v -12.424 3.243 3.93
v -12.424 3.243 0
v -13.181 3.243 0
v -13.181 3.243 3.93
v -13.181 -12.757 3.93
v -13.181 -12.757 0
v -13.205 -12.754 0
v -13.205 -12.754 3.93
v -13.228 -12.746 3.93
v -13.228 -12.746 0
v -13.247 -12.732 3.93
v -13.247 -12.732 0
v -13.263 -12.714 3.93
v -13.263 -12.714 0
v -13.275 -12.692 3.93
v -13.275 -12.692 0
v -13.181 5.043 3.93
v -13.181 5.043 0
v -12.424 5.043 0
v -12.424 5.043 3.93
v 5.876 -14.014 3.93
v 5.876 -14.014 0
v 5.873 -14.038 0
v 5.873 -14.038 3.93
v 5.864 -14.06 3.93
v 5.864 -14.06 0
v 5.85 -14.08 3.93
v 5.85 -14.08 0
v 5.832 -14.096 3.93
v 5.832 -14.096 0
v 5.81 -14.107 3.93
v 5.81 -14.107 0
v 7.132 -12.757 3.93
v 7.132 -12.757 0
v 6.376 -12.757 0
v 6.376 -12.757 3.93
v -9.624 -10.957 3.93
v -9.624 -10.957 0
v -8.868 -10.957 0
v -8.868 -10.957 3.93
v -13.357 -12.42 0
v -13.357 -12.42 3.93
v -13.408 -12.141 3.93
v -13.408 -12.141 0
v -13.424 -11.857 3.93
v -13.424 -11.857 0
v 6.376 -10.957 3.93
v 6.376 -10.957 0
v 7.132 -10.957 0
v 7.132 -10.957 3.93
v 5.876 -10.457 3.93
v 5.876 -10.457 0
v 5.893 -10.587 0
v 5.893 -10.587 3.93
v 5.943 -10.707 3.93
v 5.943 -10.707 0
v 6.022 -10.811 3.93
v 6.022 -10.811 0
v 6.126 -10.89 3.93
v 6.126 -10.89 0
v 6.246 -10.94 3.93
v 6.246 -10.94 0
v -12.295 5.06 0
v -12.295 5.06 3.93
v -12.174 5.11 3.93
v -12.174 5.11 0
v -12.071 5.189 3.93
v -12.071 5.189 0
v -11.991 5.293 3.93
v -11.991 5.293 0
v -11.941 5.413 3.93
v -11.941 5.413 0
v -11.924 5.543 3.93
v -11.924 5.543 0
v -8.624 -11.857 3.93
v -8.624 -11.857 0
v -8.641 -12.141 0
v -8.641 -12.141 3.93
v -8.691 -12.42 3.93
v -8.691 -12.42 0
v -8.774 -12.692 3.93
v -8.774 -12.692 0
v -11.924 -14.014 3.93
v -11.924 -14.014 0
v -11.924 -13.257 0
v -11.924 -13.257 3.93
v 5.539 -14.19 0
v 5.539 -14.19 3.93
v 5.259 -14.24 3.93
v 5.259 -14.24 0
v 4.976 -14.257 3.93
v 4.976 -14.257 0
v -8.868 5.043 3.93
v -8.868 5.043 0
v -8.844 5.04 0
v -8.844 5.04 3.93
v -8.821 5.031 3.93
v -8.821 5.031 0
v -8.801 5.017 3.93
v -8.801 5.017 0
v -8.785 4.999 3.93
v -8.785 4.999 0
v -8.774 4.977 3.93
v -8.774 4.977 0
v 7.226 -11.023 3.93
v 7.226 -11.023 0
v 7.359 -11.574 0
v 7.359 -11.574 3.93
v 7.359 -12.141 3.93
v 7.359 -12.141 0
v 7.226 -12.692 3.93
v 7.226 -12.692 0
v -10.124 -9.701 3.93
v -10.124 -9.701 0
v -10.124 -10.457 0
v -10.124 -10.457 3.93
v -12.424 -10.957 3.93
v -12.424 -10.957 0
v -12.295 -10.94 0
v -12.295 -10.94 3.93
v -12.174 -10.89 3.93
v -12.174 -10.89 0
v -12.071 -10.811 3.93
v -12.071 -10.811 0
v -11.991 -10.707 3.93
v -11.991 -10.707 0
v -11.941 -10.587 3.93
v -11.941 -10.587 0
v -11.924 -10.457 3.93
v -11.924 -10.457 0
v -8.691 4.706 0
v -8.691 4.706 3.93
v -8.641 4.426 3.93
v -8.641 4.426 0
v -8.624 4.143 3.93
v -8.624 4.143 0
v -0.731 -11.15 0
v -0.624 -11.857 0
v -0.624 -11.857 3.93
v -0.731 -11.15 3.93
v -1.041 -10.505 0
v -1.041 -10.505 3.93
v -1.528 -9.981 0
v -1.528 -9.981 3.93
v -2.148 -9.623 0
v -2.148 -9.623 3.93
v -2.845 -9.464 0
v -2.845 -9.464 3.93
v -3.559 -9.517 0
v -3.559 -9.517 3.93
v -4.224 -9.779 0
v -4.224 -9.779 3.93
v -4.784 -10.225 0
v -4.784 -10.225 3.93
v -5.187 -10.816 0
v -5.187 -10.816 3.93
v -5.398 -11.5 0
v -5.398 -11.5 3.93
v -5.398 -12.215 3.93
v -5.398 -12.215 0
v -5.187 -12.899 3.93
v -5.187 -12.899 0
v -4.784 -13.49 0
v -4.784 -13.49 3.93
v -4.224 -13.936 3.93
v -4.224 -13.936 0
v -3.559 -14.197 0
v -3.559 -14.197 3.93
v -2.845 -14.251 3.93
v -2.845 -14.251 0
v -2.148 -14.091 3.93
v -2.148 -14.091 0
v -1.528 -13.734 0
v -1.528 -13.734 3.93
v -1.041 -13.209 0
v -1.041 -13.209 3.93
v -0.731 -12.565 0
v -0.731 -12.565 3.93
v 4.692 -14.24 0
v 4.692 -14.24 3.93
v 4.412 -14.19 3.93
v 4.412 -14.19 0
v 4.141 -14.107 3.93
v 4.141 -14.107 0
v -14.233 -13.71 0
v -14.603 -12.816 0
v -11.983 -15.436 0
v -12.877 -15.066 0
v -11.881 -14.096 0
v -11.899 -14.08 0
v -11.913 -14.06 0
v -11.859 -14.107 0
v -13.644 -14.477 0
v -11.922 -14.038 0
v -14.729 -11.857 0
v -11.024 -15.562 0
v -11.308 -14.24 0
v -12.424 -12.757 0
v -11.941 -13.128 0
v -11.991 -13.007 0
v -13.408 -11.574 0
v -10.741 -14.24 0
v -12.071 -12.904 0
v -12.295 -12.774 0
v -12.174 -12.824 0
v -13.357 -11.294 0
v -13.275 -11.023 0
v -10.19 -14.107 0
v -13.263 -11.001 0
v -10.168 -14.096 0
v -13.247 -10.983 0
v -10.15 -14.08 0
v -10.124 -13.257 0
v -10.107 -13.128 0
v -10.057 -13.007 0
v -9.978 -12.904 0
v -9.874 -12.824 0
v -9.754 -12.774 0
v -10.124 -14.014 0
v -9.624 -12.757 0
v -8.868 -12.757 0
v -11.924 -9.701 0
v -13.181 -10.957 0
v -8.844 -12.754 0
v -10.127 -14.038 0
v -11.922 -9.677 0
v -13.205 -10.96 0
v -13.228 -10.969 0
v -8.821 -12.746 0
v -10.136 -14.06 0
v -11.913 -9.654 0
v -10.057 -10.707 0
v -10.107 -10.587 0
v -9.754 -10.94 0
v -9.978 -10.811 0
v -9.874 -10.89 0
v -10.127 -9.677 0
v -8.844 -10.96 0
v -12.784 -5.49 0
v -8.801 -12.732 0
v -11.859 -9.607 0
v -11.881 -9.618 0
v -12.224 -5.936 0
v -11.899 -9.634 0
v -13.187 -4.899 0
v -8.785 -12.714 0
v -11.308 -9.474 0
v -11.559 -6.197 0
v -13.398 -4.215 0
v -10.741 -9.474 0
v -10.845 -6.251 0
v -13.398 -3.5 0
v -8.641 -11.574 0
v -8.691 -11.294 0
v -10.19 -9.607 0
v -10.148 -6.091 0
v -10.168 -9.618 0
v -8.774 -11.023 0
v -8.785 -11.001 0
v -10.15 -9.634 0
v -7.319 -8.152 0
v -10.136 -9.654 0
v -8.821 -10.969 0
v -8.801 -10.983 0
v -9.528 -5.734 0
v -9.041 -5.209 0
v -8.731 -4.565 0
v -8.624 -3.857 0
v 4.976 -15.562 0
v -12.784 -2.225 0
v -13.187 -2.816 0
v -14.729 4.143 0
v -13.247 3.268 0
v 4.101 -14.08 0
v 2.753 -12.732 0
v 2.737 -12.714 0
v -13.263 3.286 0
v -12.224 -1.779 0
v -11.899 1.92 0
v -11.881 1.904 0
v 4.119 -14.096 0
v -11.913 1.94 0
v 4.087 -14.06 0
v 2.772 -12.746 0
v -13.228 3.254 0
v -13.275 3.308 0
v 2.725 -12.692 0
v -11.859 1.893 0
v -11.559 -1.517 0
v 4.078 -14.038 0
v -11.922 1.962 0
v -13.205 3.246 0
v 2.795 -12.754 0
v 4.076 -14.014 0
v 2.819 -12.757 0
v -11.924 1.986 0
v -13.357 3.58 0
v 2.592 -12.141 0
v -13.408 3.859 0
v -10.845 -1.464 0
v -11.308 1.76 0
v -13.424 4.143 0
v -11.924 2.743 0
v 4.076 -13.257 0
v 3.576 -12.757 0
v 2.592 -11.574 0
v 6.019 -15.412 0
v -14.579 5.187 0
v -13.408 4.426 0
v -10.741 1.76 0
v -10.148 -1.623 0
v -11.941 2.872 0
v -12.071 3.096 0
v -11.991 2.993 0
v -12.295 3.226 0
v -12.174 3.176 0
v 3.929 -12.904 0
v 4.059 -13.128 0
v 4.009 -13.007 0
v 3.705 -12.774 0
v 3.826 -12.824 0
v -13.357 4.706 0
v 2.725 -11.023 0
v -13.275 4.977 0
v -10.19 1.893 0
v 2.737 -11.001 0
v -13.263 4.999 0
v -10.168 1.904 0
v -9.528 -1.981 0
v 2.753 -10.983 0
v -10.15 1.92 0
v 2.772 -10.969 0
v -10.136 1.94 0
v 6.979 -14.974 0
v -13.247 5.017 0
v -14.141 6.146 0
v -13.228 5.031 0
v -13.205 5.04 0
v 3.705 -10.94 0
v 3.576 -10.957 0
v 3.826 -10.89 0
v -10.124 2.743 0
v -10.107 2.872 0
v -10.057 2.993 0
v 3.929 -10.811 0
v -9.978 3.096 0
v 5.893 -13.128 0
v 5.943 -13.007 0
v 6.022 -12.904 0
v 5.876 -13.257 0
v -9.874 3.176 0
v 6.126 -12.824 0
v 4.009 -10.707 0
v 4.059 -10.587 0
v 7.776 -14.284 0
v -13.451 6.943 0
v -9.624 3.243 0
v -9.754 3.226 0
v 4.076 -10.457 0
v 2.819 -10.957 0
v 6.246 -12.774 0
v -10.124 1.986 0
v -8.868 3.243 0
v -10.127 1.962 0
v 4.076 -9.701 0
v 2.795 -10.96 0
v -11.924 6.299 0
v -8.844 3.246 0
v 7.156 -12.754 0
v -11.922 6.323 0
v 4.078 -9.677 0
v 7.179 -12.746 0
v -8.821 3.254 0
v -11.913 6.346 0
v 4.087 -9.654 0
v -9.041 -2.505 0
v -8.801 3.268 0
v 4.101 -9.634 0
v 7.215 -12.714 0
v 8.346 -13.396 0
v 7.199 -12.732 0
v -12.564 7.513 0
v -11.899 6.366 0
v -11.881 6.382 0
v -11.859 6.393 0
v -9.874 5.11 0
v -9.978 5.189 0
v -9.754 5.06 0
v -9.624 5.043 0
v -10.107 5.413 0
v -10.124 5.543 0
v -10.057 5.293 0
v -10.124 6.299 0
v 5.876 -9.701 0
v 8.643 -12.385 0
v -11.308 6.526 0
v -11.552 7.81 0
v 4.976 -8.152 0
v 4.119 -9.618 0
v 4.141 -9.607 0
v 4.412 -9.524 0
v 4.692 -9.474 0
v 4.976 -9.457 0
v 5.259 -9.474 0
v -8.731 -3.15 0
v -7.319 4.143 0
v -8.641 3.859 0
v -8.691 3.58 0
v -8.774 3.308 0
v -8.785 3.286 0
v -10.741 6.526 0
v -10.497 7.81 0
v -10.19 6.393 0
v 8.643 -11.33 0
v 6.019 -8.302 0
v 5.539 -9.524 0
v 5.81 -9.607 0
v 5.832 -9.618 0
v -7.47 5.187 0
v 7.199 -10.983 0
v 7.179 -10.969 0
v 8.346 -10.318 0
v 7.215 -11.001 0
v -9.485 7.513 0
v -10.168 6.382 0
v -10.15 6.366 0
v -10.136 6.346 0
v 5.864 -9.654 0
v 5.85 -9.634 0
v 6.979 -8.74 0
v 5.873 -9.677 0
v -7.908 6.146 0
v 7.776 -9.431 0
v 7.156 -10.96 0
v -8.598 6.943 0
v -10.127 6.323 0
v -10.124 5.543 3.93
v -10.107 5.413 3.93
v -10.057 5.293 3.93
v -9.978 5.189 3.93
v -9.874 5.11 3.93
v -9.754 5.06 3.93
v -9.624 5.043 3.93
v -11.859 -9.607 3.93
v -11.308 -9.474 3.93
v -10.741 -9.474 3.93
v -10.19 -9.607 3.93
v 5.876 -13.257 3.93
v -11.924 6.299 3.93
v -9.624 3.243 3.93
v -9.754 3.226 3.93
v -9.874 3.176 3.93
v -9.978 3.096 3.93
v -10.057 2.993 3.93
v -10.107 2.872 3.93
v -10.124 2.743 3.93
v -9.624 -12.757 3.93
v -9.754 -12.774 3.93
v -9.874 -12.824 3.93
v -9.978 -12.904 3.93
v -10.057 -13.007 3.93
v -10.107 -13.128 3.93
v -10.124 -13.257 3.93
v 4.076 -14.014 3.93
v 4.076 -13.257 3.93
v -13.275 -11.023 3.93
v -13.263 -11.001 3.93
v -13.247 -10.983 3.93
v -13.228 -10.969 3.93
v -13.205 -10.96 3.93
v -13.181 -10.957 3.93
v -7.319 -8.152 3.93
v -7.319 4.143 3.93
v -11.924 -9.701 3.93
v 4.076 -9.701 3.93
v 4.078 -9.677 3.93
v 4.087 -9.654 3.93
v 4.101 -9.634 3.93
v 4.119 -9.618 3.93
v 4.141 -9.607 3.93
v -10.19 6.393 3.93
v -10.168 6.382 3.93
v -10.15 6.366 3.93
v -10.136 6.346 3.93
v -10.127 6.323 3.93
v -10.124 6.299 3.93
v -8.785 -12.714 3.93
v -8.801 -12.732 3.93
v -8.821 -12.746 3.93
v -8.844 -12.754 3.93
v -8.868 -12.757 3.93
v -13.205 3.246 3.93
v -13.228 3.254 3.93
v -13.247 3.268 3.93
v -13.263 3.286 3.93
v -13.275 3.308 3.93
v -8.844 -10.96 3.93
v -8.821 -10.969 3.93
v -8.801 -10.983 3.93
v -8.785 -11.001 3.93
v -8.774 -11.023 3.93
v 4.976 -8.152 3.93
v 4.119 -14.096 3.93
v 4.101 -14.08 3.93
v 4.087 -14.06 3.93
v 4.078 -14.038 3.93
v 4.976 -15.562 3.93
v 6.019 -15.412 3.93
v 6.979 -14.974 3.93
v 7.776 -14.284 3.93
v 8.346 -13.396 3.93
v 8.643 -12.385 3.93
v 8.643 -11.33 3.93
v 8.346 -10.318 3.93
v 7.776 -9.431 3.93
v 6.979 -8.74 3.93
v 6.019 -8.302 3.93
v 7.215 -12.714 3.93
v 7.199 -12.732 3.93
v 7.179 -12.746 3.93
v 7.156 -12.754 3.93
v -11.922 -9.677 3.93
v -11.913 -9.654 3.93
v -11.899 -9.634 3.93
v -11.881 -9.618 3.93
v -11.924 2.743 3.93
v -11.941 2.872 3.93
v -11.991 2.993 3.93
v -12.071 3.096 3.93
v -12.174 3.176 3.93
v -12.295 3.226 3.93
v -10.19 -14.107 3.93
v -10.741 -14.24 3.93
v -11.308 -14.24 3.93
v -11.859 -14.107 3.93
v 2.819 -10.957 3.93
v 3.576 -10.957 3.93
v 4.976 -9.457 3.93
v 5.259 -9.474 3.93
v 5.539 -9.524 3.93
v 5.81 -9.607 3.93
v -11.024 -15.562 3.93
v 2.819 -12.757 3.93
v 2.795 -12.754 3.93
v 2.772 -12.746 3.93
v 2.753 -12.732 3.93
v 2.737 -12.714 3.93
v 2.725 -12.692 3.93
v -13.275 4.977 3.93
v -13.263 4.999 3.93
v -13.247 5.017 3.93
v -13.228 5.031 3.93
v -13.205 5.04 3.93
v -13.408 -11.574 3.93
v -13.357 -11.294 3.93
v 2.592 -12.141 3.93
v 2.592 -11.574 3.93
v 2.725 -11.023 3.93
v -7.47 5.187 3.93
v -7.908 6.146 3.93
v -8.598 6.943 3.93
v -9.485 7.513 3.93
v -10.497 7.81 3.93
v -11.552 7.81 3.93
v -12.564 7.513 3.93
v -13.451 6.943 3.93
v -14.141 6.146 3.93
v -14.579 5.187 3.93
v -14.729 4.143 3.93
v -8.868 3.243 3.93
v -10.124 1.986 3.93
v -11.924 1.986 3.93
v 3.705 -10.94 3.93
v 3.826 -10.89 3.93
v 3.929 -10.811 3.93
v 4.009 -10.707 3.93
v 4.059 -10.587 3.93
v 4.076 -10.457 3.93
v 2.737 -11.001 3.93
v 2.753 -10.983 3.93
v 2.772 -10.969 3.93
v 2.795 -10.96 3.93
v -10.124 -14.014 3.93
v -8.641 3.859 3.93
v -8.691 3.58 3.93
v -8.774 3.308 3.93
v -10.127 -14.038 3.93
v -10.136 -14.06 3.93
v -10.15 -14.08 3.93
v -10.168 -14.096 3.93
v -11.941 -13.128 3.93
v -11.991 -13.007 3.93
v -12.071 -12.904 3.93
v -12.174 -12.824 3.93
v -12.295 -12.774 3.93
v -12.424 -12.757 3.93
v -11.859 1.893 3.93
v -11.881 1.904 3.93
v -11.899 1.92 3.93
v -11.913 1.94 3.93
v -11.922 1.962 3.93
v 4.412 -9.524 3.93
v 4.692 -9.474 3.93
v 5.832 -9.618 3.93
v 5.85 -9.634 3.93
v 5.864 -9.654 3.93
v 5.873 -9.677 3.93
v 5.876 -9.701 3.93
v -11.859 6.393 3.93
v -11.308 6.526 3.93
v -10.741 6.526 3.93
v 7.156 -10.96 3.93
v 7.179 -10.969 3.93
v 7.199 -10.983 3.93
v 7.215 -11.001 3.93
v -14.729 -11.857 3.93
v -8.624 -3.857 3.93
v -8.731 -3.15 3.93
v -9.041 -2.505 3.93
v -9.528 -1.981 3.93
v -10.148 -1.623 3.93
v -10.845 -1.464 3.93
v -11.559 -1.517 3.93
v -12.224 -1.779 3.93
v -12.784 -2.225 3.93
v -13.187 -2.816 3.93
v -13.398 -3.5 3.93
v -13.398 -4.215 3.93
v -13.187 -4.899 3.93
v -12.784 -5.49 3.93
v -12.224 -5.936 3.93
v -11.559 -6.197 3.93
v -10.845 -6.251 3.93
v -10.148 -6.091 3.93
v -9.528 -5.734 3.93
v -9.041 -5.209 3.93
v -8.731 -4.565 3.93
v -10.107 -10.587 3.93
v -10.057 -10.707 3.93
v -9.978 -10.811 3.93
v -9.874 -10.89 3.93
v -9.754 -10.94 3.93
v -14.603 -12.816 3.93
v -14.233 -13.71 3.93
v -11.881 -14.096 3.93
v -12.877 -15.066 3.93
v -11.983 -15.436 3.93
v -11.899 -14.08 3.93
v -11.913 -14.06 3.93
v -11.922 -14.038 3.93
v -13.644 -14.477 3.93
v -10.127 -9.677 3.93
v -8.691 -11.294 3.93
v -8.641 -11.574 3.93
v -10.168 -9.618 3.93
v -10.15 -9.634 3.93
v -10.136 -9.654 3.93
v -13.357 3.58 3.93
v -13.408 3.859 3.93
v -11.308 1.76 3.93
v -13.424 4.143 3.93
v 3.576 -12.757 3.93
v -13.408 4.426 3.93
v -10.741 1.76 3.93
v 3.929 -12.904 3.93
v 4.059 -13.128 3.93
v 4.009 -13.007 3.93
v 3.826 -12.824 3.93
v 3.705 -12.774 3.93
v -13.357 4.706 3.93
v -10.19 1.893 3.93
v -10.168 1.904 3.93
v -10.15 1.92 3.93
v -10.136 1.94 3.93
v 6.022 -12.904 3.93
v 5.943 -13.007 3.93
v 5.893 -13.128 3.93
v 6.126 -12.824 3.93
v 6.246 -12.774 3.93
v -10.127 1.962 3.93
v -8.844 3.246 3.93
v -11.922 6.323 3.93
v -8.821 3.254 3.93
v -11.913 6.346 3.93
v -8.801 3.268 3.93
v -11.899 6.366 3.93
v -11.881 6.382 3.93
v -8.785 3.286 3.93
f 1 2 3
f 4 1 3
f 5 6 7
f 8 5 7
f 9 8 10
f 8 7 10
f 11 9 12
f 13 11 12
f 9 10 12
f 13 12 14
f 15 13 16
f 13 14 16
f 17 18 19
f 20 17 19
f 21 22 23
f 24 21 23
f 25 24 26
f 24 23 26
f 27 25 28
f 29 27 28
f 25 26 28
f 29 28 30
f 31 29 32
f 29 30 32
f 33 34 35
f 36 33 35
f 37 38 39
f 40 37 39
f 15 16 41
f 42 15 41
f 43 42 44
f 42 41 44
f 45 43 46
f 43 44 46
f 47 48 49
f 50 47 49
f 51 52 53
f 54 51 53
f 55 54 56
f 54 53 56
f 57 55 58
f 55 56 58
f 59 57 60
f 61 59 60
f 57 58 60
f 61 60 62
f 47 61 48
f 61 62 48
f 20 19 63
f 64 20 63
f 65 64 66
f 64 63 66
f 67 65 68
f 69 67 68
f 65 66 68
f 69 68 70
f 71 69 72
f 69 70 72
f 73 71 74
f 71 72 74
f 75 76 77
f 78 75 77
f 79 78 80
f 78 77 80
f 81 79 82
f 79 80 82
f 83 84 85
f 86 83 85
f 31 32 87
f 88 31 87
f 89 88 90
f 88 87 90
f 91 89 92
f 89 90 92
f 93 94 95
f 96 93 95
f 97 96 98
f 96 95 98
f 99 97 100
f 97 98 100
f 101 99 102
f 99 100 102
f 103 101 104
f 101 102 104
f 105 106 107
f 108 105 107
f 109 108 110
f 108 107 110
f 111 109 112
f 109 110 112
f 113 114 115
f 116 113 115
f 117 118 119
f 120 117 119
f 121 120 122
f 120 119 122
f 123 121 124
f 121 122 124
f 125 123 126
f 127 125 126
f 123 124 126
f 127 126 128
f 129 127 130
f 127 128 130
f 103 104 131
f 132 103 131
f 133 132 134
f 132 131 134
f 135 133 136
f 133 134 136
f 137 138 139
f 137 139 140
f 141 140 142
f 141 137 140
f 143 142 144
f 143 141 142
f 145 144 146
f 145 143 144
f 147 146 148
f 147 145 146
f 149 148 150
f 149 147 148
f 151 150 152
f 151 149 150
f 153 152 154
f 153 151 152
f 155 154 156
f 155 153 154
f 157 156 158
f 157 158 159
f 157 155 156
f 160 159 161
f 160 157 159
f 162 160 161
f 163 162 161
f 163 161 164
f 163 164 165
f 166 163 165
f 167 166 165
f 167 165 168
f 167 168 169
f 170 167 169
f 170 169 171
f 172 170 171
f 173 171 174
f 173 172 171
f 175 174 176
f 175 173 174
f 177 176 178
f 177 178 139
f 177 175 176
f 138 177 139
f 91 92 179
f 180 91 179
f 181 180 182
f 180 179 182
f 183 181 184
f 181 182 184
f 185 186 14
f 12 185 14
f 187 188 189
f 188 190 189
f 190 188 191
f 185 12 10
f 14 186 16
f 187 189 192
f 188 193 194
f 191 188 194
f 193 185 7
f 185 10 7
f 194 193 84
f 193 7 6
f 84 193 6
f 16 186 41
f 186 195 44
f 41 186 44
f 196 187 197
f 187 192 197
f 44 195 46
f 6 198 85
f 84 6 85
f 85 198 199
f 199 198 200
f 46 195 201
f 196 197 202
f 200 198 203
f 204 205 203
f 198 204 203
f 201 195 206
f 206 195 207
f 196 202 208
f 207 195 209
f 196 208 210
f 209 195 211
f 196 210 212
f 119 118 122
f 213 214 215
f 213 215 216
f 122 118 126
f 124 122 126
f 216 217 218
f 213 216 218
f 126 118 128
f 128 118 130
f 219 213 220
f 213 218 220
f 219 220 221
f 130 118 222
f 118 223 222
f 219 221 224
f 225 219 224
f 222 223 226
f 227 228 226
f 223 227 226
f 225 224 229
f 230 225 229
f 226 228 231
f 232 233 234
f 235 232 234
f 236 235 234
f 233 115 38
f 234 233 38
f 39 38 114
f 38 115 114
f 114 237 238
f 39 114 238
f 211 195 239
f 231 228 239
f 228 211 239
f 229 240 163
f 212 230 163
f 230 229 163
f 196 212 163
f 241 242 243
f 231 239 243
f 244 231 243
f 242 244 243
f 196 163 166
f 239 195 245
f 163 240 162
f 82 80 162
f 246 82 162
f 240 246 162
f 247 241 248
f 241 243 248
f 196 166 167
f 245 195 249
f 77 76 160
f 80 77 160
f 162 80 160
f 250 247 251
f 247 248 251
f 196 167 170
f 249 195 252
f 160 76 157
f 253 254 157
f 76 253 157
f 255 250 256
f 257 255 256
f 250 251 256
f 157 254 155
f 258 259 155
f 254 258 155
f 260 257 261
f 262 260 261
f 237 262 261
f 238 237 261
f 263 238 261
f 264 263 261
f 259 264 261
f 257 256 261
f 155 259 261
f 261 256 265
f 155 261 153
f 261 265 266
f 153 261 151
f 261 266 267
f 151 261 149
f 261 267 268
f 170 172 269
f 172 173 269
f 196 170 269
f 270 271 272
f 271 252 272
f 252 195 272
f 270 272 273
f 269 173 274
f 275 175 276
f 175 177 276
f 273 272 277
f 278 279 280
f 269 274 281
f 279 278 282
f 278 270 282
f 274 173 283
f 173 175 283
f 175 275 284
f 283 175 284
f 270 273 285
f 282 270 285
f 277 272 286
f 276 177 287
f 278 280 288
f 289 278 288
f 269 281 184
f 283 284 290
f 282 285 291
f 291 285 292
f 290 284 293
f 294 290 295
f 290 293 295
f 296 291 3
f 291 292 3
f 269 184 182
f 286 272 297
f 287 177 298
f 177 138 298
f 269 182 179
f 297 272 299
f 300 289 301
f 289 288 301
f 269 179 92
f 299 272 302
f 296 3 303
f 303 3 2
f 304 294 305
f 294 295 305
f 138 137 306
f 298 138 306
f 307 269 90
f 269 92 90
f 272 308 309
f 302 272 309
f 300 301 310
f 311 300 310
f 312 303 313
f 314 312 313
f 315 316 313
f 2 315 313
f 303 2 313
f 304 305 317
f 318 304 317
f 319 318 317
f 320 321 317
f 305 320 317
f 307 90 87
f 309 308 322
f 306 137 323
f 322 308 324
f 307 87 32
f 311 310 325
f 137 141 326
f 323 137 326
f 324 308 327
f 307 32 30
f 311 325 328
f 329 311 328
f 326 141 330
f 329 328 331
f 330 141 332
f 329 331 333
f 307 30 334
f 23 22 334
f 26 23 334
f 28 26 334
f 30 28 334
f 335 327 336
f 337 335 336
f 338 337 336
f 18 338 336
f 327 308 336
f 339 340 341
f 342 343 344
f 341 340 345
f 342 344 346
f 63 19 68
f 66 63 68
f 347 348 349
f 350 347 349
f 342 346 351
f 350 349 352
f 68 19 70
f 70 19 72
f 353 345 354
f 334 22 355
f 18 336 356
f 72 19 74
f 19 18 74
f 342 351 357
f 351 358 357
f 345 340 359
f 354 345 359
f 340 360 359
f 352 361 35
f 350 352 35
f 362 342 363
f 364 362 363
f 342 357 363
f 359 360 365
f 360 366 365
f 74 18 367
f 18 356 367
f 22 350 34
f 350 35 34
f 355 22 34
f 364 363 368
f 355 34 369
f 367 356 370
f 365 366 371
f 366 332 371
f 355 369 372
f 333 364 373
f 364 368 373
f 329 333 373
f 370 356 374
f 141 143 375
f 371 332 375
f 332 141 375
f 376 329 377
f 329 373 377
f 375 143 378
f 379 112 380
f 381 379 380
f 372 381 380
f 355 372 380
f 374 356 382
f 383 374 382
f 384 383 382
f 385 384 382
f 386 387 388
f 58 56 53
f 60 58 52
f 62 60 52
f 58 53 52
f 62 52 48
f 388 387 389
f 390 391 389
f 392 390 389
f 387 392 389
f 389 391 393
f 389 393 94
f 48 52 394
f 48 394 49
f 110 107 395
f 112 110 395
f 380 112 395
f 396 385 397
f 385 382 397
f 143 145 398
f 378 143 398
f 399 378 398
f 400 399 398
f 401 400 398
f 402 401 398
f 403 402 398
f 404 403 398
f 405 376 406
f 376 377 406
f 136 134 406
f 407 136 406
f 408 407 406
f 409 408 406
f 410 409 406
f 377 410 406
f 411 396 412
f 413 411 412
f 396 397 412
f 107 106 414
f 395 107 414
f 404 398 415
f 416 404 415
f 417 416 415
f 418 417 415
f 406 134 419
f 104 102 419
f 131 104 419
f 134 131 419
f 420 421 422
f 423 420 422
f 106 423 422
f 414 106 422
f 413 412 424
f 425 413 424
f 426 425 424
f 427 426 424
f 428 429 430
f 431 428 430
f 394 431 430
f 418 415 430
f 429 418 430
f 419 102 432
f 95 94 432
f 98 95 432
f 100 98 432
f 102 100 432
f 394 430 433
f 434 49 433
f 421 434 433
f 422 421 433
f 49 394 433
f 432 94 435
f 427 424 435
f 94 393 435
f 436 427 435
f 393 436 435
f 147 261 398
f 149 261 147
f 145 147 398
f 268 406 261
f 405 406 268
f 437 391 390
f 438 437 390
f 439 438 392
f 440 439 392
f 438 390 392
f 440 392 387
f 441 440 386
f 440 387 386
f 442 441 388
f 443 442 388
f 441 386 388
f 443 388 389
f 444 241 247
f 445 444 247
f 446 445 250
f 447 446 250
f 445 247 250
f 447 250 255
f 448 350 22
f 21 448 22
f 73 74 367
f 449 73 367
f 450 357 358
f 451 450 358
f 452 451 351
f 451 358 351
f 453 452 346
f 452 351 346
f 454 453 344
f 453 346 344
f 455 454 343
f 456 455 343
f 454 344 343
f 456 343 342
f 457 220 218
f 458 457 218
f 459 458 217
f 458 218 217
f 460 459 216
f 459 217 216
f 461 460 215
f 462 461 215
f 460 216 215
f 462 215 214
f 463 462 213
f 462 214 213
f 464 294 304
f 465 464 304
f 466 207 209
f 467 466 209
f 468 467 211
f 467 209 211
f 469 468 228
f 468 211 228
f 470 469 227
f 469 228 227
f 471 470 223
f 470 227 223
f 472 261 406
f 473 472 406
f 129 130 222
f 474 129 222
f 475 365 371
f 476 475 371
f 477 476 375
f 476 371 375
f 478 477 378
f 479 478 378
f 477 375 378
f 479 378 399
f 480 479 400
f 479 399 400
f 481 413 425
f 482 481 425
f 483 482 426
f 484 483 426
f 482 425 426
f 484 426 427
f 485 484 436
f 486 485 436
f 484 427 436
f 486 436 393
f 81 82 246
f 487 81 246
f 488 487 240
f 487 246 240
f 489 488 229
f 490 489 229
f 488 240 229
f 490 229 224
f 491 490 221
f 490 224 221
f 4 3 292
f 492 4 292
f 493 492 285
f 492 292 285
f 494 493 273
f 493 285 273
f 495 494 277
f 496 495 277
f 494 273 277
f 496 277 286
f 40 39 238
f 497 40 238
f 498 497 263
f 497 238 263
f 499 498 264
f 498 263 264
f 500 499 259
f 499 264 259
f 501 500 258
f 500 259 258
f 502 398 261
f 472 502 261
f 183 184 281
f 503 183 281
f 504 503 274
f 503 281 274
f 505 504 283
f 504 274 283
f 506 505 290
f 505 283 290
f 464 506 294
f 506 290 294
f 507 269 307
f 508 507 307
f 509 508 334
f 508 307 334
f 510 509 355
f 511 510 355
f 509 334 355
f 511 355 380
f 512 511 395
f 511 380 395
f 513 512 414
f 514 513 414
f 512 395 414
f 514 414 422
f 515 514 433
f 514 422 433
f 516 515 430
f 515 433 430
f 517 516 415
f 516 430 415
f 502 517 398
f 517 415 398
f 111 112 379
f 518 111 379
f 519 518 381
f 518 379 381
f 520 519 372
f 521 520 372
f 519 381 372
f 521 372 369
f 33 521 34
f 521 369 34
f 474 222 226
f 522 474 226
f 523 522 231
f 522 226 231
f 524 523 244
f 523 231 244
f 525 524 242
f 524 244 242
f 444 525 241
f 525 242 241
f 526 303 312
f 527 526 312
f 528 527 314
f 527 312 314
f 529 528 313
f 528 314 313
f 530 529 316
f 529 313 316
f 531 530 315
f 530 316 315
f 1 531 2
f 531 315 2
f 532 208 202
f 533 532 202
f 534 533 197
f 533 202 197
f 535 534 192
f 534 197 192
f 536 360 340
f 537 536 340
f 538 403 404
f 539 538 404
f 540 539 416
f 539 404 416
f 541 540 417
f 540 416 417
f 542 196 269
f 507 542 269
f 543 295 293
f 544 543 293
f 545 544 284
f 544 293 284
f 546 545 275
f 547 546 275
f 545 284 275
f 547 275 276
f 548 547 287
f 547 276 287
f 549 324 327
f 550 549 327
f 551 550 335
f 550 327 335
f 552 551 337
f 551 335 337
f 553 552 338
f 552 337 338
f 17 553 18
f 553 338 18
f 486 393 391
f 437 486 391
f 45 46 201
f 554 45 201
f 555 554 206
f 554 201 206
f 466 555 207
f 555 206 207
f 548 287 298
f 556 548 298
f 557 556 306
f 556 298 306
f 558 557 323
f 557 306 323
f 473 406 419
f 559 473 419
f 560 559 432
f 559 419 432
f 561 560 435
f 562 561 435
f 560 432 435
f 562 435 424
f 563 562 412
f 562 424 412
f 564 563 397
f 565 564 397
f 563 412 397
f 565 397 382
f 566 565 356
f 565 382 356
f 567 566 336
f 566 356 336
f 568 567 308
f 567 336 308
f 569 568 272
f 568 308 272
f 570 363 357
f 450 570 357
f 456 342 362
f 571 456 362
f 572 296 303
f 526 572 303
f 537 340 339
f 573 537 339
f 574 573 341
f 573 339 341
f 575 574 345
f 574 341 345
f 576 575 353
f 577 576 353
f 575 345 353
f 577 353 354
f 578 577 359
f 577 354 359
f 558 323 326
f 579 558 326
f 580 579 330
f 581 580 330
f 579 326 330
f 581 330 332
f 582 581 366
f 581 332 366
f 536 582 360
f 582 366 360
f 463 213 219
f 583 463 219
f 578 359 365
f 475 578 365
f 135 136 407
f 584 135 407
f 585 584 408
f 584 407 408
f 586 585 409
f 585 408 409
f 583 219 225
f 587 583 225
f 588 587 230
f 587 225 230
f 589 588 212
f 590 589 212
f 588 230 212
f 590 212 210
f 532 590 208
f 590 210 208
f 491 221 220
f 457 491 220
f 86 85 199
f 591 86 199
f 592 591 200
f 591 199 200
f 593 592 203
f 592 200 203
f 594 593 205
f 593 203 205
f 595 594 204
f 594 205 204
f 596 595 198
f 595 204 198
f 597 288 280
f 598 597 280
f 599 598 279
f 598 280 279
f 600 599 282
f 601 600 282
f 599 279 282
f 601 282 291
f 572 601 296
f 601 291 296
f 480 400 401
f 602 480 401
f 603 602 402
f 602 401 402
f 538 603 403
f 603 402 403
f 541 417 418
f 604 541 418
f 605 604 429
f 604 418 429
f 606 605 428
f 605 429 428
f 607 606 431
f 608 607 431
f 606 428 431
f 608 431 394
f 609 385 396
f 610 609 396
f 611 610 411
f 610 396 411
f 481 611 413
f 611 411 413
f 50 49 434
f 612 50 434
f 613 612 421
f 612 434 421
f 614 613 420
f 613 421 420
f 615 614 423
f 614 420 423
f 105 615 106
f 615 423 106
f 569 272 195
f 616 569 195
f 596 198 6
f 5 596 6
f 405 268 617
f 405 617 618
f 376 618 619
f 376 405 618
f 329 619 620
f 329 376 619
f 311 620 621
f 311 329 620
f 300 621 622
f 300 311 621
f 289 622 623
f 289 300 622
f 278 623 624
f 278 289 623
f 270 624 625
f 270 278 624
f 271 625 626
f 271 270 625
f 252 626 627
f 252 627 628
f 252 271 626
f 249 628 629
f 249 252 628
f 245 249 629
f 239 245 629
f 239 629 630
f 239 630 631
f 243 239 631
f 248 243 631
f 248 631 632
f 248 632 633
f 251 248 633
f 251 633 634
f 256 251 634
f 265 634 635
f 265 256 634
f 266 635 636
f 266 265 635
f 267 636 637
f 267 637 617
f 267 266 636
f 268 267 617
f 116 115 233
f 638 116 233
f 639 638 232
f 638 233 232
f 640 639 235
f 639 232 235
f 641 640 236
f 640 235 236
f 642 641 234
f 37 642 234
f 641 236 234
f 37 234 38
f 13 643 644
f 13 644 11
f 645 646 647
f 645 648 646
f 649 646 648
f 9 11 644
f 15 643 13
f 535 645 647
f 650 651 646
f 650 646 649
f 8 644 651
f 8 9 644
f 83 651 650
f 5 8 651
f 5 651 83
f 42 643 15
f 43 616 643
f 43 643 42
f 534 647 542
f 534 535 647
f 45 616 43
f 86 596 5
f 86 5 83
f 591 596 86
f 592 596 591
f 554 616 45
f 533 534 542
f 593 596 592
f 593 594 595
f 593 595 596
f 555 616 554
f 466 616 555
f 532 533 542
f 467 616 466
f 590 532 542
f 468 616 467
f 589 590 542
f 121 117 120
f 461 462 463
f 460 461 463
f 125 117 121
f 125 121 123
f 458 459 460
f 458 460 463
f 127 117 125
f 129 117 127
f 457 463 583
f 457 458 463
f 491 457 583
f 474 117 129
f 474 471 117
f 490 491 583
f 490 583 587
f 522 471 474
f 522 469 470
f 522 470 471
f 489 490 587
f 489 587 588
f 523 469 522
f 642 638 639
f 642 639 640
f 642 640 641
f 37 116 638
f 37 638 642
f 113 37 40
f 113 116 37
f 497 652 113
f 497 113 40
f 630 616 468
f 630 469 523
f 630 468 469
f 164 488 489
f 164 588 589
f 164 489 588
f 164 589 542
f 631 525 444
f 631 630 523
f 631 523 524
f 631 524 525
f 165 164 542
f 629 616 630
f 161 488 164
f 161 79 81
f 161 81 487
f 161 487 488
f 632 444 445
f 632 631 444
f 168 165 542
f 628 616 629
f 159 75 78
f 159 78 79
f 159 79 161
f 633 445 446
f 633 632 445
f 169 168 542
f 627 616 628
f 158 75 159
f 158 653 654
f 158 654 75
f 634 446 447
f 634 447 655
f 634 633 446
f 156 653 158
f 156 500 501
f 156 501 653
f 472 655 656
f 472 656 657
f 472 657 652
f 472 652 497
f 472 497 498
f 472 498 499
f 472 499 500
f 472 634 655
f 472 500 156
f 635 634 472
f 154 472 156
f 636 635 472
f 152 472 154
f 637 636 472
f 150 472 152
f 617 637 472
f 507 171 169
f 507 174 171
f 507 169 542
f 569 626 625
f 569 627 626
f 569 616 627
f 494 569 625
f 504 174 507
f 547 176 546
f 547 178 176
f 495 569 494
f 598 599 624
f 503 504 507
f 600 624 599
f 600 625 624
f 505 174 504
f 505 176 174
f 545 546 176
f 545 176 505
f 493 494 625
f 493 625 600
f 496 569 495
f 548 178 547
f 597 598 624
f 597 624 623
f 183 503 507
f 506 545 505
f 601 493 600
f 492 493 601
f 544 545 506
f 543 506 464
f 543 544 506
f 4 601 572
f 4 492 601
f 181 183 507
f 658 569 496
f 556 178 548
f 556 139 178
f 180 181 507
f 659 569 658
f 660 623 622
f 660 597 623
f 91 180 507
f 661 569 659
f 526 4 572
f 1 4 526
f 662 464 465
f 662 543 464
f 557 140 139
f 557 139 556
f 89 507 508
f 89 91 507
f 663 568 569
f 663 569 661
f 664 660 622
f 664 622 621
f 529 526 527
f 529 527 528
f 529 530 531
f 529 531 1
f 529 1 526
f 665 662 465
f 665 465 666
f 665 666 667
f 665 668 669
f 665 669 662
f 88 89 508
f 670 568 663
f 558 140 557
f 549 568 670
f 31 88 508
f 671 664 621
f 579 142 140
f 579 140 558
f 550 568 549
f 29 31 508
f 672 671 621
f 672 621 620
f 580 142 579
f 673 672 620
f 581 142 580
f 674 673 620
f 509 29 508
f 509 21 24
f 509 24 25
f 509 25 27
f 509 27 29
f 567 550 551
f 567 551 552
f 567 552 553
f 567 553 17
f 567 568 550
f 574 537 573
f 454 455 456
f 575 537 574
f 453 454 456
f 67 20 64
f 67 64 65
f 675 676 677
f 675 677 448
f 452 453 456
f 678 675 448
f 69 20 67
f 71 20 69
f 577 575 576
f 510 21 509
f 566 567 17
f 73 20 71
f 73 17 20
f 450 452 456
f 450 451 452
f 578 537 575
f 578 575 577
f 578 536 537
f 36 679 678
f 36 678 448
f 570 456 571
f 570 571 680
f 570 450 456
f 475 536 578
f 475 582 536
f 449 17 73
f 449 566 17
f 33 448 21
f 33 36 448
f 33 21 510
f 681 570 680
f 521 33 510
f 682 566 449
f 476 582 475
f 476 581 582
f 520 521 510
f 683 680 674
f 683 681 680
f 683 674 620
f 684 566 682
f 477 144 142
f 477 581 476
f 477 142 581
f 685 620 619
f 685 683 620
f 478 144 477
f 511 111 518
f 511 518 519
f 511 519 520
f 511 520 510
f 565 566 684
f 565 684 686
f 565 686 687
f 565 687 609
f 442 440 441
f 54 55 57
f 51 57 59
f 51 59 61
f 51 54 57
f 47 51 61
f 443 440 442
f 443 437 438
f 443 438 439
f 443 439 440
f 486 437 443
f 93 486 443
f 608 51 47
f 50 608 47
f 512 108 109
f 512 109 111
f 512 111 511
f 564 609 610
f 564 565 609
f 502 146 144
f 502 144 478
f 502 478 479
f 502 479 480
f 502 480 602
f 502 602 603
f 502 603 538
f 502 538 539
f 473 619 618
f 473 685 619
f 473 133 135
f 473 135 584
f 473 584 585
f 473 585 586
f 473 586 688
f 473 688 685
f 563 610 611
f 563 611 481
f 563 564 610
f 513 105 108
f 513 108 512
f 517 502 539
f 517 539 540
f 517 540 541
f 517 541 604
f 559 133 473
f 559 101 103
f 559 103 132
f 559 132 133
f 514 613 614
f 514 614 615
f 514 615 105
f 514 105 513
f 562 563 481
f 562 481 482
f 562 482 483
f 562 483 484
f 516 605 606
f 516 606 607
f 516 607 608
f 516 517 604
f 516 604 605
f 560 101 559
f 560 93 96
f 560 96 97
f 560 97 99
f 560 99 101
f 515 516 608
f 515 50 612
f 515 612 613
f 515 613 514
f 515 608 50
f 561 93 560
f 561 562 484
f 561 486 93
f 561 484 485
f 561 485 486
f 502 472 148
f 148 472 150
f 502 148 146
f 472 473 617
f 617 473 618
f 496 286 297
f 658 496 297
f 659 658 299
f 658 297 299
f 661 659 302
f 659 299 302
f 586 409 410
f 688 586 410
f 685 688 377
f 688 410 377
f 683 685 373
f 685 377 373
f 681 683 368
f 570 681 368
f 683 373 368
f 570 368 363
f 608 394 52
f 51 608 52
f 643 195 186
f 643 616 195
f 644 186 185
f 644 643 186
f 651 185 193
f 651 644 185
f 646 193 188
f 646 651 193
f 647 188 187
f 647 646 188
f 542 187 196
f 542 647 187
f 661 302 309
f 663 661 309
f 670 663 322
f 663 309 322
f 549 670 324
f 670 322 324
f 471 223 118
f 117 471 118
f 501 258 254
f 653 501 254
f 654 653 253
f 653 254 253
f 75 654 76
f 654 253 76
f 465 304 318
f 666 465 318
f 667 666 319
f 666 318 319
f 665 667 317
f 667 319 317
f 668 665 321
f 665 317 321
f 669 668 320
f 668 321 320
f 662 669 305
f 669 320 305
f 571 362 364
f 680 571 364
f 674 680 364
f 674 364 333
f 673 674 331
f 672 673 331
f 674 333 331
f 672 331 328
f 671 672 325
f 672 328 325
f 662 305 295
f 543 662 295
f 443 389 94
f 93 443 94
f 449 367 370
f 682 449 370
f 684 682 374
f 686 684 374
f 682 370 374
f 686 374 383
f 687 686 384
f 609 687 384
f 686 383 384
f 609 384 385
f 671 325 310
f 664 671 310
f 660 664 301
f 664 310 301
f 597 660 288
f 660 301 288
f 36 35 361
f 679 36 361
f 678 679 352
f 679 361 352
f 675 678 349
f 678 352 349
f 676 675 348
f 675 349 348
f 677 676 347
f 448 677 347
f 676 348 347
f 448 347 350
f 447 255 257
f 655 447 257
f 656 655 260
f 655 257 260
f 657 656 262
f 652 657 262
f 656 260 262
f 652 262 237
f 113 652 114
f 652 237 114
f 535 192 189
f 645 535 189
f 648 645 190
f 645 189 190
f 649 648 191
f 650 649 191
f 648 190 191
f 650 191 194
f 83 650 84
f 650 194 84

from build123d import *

# Parameters (mm, degrees)
F0_R     = 2.4
F1_DEPTH = 3.93
F2_R     = 3.705


with BuildPart() as f1:
    # F0 (on Top) → F1 (new body)
    with BuildSketch(Plane.XY):
        with BuildLine():
            Line((-7.319459, -8.152287), (-7.319459, 4.142713))
            ThreePointArc((-7.319459, 4.142713), (-11.024459, 7.847713), (-14.729459, 4.142713))
            Line((-14.729459, 4.142713), (-14.729459, -15.562287))
            Line((-14.729459, -15.562287), (4.975541, -15.562287))
            ThreePointArc((4.975541, -15.562287), (8.680541, -11.857287), (4.975541, -8.152287))
            Line((4.975541, -8.152287), (-7.319459, -8.152287))
        make_face()
        with BuildLine():
            ThreePointArc((-8.624459, -11.857287), (-8.662221, -12.281351), (-8.774317, -12.69207))
            ThreePointArc((-8.774317, -12.69207), (-8.810969, -12.739379), (-8.868073, -12.757287))
            Line((-8.868073, -12.757287), (-9.624459, -12.757287))
            ThreePointArc((-9.624459, -12.757287), (-9.978012, -12.903734), (-10.124459, -13.257287))
            Line((-10.124459, -13.257287), (-10.124459, -14.013673))
            ThreePointArc((-10.124459, -14.013673), (-10.142367, -14.070777), (-10.189676, -14.107429))
            ThreePointArc((-10.189676, -14.107429), (-11.024459, -14.257287), (-11.859241, -14.107429))
            ThreePointArc((-11.859241, -14.107429), (-11.906551, -14.070777), (-11.924459, -14.013673))
            Line((-11.924459, -14.013673), (-11.924459, -13.257287))
            ThreePointArc((-11.924459, -13.257287), (-12.070905, -12.903734), (-12.424459, -12.757287))
            Line((-12.424459, -12.757287), (-13.180845, -12.757287))
            ThreePointArc((-13.180845, -12.757287), (-13.237949, -12.739379), (-13.274601, -12.69207))
            ThreePointArc((-13.274601, -12.69207), (-13.386697, -12.281351), (-13.424459, -11.857287))
            ThreePointArc((-13.424459, -11.857287), (-13.386697, -11.433224), (-13.274601, -11.022505))
            ThreePointArc((-13.274601, -11.022505), (-13.237949, -10.975195), (-13.180845, -10.957287))
            Line((-13.180845, -10.957287), (-12.424459, -10.957287))
            ThreePointArc((-12.424459, -10.957287), (-12.070905, -10.810841), (-11.924459, -10.457287))
            Line((-11.924459, -10.457287), (-11.924459, -9.700901))
            ThreePointArc((-11.924459, -9.700901), (-11.906551, -9.643797), (-11.859241, -9.607145))
            ThreePointArc((-11.859241, -9.607145), (-11.024459, -9.457287), (-10.189676, -9.607145))
            ThreePointArc((-10.189676, -9.607145), (-10.142367, -9.643797), (-10.124459, -9.700901))
            Line((-10.124459, -9.700901), (-10.124459, -10.457287))
            ThreePointArc((-10.124459, -10.457287), (-9.978012, -10.810841), (-9.624459, -10.957287))
            Line((-9.624459, -10.957287), (-8.868073, -10.957287))
            ThreePointArc((-8.868073, -10.957287), (-8.810969, -10.975195), (-8.774317, -11.022505))
            ThreePointArc((-8.774317, -11.022505), (-8.662221, -11.433224), (-8.624459, -11.857287))
        make_face(mode=Mode.SUBTRACT)
        with Locations((-3.024459, -11.857287)):
            Circle(F0_R, mode=Mode.SUBTRACT)
        with BuildLine():
            ThreePointArc((5.810324, -14.107429), (5.399605, -14.219526), (4.975541, -14.257287))
            ThreePointArc((4.975541, -14.257287), (4.551478, -14.219526), (4.140759, -14.107429))
            ThreePointArc((4.140759, -14.107429), (4.093449, -14.070777), (4.075541, -14.013673))
            Line((4.075541, -14.013673), (4.075541, -13.257287))
            ThreePointArc((4.075541, -13.257287), (3.929095, -12.903734), (3.575541, -12.757287))
            Line((3.575541, -12.757287), (2.819155, -12.757287))
            ThreePointArc((2.819155, -12.757287), (2.762051, -12.739379), (2.725399, -12.69207))
            ThreePointArc((2.725399, -12.69207), (2.575541, -11.857287), (2.725399, -11.022505))
            ThreePointArc((2.725399, -11.022505), (2.762051, -10.975195), (2.819155, -10.957287))
            Line((2.819155, -10.957287), (3.575541, -10.957287))
            ThreePointArc((3.575541, -10.957287), (3.929095, -10.810841), (4.075541, -10.457287))
            Line((4.075541, -10.457287), (4.075541, -9.700901))
            ThreePointArc((4.075541, -9.700901), (4.093449, -9.643797), (4.140759, -9.607145))
            ThreePointArc((4.140759, -9.607145), (4.551478, -9.495049), (4.975541, -9.457287))
            ThreePointArc((4.975541, -9.457287), (5.399605, -9.495049), (5.810324, -9.607145))
            ThreePointArc((5.810324, -9.607145), (5.857633, -9.643797), (5.875541, -9.700901))
            Line((5.875541, -9.700901), (5.875541, -10.457287))
            ThreePointArc((5.875541, -10.457287), (6.021988, -10.810841), (6.375541, -10.957287))
            Line((6.375541, -10.957287), (7.131927, -10.957287))
            ThreePointArc((7.131927, -10.957287), (7.189031, -10.975195), (7.225683, -11.022505))
            ThreePointArc((7.225683, -11.022505), (7.375541, -11.857287), (7.225683, -12.69207))
            ThreePointArc((7.225683, -12.69207), (7.189031, -12.739379), (7.131927, -12.757287))
            Line((7.131927, -12.757287), (6.375541, -12.757287))
            ThreePointArc((6.375541, -12.757287), (6.021988, -12.903734), (5.875541, -13.257287))
            Line((5.875541, -13.257287), (5.875541, -14.013673))
            ThreePointArc((5.875541, -14.013673), (5.857633, -14.070777), (5.810324, -14.107429))
        make_face(mode=Mode.SUBTRACT)
        with Locations((-11.024459, -3.857287)):
            Circle(F0_R, mode=Mode.SUBTRACT)
        with BuildLine():
            ThreePointArc((-12.424459, 5.042713), (-12.070905, 5.189159), (-11.924459, 5.542713))
            Line((-11.924459, 5.542713), (-11.924459, 6.299099))
            ThreePointArc((-11.924459, 6.299099), (-11.906551, 6.356203), (-11.859241, 6.392855))
            ThreePointArc((-11.859241, 6.392855), (-11.024459, 6.542713), (-10.189676, 6.392855))
            ThreePointArc((-10.189676, 6.392855), (-10.142367, 6.356203), (-10.124459, 6.299099))
            Line((-10.124459, 6.299099), (-10.124459, 5.542713))
            ThreePointArc((-10.124459, 5.542713), (-9.978012, 5.189159), (-9.624459, 5.042713))
            Line((-9.624459, 5.042713), (-8.868073, 5.042713))
            ThreePointArc((-8.868073, 5.042713), (-8.810969, 5.024805), (-8.774317, 4.977495))
            ThreePointArc((-8.774317, 4.977495), (-8.662221, 4.566776), (-8.624459, 4.142713))
            ThreePointArc((-8.624459, 4.142713), (-8.662221, 3.718649), (-8.774317, 3.30793))
            ThreePointArc((-8.774317, 3.30793), (-8.810969, 3.260621), (-8.868073, 3.242713))
            Line((-8.868073, 3.242713), (-9.624459, 3.242713))
            ThreePointArc((-9.624459, 3.242713), (-9.978012, 3.096266), (-10.124459, 2.742713))
            Line((-10.124459, 2.742713), (-10.124459, 1.986327))
            ThreePointArc((-10.124459, 1.986327), (-10.142367, 1.929223), (-10.189676, 1.892571))
            ThreePointArc((-10.189676, 1.892571), (-11.024459, 1.742713), (-11.859241, 1.892571))
            ThreePointArc((-11.859241, 1.892571), (-11.906551, 1.929223), (-11.924459, 1.986327))
            Line((-11.924459, 1.986327), (-11.924459, 2.742713))
            ThreePointArc((-11.924459, 2.742713), (-12.070905, 3.096266), (-12.424459, 3.242713))
            Line((-12.424459, 3.242713), (-13.180845, 3.242713))
            ThreePointArc((-13.180845, 3.242713), (-13.237949, 3.260621), (-13.274601, 3.30793))
            ThreePointArc((-13.274601, 3.30793), (-13.386697, 3.718649), (-13.424459, 4.142713))
            ThreePointArc((-13.424459, 4.142713), (-13.386697, 4.566776), (-13.274601, 4.977495))
            ThreePointArc((-13.274601, 4.977495), (-13.237949, 5.024805), (-13.180845, 5.042713))
            Line((-13.180845, 5.042713), (-12.424459, 5.042713))
        make_face(mode=Mode.SUBTRACT)
    extrude(amount=F1_DEPTH)

    # F2
    f2_edges = [f1.edges().sort_by_distance(p)[0] for p in [
        (-14.729459, -15.562287, 1.965),
    ]]
    fillet(f2_edges, radius=F2_R)


solid = f1.part
